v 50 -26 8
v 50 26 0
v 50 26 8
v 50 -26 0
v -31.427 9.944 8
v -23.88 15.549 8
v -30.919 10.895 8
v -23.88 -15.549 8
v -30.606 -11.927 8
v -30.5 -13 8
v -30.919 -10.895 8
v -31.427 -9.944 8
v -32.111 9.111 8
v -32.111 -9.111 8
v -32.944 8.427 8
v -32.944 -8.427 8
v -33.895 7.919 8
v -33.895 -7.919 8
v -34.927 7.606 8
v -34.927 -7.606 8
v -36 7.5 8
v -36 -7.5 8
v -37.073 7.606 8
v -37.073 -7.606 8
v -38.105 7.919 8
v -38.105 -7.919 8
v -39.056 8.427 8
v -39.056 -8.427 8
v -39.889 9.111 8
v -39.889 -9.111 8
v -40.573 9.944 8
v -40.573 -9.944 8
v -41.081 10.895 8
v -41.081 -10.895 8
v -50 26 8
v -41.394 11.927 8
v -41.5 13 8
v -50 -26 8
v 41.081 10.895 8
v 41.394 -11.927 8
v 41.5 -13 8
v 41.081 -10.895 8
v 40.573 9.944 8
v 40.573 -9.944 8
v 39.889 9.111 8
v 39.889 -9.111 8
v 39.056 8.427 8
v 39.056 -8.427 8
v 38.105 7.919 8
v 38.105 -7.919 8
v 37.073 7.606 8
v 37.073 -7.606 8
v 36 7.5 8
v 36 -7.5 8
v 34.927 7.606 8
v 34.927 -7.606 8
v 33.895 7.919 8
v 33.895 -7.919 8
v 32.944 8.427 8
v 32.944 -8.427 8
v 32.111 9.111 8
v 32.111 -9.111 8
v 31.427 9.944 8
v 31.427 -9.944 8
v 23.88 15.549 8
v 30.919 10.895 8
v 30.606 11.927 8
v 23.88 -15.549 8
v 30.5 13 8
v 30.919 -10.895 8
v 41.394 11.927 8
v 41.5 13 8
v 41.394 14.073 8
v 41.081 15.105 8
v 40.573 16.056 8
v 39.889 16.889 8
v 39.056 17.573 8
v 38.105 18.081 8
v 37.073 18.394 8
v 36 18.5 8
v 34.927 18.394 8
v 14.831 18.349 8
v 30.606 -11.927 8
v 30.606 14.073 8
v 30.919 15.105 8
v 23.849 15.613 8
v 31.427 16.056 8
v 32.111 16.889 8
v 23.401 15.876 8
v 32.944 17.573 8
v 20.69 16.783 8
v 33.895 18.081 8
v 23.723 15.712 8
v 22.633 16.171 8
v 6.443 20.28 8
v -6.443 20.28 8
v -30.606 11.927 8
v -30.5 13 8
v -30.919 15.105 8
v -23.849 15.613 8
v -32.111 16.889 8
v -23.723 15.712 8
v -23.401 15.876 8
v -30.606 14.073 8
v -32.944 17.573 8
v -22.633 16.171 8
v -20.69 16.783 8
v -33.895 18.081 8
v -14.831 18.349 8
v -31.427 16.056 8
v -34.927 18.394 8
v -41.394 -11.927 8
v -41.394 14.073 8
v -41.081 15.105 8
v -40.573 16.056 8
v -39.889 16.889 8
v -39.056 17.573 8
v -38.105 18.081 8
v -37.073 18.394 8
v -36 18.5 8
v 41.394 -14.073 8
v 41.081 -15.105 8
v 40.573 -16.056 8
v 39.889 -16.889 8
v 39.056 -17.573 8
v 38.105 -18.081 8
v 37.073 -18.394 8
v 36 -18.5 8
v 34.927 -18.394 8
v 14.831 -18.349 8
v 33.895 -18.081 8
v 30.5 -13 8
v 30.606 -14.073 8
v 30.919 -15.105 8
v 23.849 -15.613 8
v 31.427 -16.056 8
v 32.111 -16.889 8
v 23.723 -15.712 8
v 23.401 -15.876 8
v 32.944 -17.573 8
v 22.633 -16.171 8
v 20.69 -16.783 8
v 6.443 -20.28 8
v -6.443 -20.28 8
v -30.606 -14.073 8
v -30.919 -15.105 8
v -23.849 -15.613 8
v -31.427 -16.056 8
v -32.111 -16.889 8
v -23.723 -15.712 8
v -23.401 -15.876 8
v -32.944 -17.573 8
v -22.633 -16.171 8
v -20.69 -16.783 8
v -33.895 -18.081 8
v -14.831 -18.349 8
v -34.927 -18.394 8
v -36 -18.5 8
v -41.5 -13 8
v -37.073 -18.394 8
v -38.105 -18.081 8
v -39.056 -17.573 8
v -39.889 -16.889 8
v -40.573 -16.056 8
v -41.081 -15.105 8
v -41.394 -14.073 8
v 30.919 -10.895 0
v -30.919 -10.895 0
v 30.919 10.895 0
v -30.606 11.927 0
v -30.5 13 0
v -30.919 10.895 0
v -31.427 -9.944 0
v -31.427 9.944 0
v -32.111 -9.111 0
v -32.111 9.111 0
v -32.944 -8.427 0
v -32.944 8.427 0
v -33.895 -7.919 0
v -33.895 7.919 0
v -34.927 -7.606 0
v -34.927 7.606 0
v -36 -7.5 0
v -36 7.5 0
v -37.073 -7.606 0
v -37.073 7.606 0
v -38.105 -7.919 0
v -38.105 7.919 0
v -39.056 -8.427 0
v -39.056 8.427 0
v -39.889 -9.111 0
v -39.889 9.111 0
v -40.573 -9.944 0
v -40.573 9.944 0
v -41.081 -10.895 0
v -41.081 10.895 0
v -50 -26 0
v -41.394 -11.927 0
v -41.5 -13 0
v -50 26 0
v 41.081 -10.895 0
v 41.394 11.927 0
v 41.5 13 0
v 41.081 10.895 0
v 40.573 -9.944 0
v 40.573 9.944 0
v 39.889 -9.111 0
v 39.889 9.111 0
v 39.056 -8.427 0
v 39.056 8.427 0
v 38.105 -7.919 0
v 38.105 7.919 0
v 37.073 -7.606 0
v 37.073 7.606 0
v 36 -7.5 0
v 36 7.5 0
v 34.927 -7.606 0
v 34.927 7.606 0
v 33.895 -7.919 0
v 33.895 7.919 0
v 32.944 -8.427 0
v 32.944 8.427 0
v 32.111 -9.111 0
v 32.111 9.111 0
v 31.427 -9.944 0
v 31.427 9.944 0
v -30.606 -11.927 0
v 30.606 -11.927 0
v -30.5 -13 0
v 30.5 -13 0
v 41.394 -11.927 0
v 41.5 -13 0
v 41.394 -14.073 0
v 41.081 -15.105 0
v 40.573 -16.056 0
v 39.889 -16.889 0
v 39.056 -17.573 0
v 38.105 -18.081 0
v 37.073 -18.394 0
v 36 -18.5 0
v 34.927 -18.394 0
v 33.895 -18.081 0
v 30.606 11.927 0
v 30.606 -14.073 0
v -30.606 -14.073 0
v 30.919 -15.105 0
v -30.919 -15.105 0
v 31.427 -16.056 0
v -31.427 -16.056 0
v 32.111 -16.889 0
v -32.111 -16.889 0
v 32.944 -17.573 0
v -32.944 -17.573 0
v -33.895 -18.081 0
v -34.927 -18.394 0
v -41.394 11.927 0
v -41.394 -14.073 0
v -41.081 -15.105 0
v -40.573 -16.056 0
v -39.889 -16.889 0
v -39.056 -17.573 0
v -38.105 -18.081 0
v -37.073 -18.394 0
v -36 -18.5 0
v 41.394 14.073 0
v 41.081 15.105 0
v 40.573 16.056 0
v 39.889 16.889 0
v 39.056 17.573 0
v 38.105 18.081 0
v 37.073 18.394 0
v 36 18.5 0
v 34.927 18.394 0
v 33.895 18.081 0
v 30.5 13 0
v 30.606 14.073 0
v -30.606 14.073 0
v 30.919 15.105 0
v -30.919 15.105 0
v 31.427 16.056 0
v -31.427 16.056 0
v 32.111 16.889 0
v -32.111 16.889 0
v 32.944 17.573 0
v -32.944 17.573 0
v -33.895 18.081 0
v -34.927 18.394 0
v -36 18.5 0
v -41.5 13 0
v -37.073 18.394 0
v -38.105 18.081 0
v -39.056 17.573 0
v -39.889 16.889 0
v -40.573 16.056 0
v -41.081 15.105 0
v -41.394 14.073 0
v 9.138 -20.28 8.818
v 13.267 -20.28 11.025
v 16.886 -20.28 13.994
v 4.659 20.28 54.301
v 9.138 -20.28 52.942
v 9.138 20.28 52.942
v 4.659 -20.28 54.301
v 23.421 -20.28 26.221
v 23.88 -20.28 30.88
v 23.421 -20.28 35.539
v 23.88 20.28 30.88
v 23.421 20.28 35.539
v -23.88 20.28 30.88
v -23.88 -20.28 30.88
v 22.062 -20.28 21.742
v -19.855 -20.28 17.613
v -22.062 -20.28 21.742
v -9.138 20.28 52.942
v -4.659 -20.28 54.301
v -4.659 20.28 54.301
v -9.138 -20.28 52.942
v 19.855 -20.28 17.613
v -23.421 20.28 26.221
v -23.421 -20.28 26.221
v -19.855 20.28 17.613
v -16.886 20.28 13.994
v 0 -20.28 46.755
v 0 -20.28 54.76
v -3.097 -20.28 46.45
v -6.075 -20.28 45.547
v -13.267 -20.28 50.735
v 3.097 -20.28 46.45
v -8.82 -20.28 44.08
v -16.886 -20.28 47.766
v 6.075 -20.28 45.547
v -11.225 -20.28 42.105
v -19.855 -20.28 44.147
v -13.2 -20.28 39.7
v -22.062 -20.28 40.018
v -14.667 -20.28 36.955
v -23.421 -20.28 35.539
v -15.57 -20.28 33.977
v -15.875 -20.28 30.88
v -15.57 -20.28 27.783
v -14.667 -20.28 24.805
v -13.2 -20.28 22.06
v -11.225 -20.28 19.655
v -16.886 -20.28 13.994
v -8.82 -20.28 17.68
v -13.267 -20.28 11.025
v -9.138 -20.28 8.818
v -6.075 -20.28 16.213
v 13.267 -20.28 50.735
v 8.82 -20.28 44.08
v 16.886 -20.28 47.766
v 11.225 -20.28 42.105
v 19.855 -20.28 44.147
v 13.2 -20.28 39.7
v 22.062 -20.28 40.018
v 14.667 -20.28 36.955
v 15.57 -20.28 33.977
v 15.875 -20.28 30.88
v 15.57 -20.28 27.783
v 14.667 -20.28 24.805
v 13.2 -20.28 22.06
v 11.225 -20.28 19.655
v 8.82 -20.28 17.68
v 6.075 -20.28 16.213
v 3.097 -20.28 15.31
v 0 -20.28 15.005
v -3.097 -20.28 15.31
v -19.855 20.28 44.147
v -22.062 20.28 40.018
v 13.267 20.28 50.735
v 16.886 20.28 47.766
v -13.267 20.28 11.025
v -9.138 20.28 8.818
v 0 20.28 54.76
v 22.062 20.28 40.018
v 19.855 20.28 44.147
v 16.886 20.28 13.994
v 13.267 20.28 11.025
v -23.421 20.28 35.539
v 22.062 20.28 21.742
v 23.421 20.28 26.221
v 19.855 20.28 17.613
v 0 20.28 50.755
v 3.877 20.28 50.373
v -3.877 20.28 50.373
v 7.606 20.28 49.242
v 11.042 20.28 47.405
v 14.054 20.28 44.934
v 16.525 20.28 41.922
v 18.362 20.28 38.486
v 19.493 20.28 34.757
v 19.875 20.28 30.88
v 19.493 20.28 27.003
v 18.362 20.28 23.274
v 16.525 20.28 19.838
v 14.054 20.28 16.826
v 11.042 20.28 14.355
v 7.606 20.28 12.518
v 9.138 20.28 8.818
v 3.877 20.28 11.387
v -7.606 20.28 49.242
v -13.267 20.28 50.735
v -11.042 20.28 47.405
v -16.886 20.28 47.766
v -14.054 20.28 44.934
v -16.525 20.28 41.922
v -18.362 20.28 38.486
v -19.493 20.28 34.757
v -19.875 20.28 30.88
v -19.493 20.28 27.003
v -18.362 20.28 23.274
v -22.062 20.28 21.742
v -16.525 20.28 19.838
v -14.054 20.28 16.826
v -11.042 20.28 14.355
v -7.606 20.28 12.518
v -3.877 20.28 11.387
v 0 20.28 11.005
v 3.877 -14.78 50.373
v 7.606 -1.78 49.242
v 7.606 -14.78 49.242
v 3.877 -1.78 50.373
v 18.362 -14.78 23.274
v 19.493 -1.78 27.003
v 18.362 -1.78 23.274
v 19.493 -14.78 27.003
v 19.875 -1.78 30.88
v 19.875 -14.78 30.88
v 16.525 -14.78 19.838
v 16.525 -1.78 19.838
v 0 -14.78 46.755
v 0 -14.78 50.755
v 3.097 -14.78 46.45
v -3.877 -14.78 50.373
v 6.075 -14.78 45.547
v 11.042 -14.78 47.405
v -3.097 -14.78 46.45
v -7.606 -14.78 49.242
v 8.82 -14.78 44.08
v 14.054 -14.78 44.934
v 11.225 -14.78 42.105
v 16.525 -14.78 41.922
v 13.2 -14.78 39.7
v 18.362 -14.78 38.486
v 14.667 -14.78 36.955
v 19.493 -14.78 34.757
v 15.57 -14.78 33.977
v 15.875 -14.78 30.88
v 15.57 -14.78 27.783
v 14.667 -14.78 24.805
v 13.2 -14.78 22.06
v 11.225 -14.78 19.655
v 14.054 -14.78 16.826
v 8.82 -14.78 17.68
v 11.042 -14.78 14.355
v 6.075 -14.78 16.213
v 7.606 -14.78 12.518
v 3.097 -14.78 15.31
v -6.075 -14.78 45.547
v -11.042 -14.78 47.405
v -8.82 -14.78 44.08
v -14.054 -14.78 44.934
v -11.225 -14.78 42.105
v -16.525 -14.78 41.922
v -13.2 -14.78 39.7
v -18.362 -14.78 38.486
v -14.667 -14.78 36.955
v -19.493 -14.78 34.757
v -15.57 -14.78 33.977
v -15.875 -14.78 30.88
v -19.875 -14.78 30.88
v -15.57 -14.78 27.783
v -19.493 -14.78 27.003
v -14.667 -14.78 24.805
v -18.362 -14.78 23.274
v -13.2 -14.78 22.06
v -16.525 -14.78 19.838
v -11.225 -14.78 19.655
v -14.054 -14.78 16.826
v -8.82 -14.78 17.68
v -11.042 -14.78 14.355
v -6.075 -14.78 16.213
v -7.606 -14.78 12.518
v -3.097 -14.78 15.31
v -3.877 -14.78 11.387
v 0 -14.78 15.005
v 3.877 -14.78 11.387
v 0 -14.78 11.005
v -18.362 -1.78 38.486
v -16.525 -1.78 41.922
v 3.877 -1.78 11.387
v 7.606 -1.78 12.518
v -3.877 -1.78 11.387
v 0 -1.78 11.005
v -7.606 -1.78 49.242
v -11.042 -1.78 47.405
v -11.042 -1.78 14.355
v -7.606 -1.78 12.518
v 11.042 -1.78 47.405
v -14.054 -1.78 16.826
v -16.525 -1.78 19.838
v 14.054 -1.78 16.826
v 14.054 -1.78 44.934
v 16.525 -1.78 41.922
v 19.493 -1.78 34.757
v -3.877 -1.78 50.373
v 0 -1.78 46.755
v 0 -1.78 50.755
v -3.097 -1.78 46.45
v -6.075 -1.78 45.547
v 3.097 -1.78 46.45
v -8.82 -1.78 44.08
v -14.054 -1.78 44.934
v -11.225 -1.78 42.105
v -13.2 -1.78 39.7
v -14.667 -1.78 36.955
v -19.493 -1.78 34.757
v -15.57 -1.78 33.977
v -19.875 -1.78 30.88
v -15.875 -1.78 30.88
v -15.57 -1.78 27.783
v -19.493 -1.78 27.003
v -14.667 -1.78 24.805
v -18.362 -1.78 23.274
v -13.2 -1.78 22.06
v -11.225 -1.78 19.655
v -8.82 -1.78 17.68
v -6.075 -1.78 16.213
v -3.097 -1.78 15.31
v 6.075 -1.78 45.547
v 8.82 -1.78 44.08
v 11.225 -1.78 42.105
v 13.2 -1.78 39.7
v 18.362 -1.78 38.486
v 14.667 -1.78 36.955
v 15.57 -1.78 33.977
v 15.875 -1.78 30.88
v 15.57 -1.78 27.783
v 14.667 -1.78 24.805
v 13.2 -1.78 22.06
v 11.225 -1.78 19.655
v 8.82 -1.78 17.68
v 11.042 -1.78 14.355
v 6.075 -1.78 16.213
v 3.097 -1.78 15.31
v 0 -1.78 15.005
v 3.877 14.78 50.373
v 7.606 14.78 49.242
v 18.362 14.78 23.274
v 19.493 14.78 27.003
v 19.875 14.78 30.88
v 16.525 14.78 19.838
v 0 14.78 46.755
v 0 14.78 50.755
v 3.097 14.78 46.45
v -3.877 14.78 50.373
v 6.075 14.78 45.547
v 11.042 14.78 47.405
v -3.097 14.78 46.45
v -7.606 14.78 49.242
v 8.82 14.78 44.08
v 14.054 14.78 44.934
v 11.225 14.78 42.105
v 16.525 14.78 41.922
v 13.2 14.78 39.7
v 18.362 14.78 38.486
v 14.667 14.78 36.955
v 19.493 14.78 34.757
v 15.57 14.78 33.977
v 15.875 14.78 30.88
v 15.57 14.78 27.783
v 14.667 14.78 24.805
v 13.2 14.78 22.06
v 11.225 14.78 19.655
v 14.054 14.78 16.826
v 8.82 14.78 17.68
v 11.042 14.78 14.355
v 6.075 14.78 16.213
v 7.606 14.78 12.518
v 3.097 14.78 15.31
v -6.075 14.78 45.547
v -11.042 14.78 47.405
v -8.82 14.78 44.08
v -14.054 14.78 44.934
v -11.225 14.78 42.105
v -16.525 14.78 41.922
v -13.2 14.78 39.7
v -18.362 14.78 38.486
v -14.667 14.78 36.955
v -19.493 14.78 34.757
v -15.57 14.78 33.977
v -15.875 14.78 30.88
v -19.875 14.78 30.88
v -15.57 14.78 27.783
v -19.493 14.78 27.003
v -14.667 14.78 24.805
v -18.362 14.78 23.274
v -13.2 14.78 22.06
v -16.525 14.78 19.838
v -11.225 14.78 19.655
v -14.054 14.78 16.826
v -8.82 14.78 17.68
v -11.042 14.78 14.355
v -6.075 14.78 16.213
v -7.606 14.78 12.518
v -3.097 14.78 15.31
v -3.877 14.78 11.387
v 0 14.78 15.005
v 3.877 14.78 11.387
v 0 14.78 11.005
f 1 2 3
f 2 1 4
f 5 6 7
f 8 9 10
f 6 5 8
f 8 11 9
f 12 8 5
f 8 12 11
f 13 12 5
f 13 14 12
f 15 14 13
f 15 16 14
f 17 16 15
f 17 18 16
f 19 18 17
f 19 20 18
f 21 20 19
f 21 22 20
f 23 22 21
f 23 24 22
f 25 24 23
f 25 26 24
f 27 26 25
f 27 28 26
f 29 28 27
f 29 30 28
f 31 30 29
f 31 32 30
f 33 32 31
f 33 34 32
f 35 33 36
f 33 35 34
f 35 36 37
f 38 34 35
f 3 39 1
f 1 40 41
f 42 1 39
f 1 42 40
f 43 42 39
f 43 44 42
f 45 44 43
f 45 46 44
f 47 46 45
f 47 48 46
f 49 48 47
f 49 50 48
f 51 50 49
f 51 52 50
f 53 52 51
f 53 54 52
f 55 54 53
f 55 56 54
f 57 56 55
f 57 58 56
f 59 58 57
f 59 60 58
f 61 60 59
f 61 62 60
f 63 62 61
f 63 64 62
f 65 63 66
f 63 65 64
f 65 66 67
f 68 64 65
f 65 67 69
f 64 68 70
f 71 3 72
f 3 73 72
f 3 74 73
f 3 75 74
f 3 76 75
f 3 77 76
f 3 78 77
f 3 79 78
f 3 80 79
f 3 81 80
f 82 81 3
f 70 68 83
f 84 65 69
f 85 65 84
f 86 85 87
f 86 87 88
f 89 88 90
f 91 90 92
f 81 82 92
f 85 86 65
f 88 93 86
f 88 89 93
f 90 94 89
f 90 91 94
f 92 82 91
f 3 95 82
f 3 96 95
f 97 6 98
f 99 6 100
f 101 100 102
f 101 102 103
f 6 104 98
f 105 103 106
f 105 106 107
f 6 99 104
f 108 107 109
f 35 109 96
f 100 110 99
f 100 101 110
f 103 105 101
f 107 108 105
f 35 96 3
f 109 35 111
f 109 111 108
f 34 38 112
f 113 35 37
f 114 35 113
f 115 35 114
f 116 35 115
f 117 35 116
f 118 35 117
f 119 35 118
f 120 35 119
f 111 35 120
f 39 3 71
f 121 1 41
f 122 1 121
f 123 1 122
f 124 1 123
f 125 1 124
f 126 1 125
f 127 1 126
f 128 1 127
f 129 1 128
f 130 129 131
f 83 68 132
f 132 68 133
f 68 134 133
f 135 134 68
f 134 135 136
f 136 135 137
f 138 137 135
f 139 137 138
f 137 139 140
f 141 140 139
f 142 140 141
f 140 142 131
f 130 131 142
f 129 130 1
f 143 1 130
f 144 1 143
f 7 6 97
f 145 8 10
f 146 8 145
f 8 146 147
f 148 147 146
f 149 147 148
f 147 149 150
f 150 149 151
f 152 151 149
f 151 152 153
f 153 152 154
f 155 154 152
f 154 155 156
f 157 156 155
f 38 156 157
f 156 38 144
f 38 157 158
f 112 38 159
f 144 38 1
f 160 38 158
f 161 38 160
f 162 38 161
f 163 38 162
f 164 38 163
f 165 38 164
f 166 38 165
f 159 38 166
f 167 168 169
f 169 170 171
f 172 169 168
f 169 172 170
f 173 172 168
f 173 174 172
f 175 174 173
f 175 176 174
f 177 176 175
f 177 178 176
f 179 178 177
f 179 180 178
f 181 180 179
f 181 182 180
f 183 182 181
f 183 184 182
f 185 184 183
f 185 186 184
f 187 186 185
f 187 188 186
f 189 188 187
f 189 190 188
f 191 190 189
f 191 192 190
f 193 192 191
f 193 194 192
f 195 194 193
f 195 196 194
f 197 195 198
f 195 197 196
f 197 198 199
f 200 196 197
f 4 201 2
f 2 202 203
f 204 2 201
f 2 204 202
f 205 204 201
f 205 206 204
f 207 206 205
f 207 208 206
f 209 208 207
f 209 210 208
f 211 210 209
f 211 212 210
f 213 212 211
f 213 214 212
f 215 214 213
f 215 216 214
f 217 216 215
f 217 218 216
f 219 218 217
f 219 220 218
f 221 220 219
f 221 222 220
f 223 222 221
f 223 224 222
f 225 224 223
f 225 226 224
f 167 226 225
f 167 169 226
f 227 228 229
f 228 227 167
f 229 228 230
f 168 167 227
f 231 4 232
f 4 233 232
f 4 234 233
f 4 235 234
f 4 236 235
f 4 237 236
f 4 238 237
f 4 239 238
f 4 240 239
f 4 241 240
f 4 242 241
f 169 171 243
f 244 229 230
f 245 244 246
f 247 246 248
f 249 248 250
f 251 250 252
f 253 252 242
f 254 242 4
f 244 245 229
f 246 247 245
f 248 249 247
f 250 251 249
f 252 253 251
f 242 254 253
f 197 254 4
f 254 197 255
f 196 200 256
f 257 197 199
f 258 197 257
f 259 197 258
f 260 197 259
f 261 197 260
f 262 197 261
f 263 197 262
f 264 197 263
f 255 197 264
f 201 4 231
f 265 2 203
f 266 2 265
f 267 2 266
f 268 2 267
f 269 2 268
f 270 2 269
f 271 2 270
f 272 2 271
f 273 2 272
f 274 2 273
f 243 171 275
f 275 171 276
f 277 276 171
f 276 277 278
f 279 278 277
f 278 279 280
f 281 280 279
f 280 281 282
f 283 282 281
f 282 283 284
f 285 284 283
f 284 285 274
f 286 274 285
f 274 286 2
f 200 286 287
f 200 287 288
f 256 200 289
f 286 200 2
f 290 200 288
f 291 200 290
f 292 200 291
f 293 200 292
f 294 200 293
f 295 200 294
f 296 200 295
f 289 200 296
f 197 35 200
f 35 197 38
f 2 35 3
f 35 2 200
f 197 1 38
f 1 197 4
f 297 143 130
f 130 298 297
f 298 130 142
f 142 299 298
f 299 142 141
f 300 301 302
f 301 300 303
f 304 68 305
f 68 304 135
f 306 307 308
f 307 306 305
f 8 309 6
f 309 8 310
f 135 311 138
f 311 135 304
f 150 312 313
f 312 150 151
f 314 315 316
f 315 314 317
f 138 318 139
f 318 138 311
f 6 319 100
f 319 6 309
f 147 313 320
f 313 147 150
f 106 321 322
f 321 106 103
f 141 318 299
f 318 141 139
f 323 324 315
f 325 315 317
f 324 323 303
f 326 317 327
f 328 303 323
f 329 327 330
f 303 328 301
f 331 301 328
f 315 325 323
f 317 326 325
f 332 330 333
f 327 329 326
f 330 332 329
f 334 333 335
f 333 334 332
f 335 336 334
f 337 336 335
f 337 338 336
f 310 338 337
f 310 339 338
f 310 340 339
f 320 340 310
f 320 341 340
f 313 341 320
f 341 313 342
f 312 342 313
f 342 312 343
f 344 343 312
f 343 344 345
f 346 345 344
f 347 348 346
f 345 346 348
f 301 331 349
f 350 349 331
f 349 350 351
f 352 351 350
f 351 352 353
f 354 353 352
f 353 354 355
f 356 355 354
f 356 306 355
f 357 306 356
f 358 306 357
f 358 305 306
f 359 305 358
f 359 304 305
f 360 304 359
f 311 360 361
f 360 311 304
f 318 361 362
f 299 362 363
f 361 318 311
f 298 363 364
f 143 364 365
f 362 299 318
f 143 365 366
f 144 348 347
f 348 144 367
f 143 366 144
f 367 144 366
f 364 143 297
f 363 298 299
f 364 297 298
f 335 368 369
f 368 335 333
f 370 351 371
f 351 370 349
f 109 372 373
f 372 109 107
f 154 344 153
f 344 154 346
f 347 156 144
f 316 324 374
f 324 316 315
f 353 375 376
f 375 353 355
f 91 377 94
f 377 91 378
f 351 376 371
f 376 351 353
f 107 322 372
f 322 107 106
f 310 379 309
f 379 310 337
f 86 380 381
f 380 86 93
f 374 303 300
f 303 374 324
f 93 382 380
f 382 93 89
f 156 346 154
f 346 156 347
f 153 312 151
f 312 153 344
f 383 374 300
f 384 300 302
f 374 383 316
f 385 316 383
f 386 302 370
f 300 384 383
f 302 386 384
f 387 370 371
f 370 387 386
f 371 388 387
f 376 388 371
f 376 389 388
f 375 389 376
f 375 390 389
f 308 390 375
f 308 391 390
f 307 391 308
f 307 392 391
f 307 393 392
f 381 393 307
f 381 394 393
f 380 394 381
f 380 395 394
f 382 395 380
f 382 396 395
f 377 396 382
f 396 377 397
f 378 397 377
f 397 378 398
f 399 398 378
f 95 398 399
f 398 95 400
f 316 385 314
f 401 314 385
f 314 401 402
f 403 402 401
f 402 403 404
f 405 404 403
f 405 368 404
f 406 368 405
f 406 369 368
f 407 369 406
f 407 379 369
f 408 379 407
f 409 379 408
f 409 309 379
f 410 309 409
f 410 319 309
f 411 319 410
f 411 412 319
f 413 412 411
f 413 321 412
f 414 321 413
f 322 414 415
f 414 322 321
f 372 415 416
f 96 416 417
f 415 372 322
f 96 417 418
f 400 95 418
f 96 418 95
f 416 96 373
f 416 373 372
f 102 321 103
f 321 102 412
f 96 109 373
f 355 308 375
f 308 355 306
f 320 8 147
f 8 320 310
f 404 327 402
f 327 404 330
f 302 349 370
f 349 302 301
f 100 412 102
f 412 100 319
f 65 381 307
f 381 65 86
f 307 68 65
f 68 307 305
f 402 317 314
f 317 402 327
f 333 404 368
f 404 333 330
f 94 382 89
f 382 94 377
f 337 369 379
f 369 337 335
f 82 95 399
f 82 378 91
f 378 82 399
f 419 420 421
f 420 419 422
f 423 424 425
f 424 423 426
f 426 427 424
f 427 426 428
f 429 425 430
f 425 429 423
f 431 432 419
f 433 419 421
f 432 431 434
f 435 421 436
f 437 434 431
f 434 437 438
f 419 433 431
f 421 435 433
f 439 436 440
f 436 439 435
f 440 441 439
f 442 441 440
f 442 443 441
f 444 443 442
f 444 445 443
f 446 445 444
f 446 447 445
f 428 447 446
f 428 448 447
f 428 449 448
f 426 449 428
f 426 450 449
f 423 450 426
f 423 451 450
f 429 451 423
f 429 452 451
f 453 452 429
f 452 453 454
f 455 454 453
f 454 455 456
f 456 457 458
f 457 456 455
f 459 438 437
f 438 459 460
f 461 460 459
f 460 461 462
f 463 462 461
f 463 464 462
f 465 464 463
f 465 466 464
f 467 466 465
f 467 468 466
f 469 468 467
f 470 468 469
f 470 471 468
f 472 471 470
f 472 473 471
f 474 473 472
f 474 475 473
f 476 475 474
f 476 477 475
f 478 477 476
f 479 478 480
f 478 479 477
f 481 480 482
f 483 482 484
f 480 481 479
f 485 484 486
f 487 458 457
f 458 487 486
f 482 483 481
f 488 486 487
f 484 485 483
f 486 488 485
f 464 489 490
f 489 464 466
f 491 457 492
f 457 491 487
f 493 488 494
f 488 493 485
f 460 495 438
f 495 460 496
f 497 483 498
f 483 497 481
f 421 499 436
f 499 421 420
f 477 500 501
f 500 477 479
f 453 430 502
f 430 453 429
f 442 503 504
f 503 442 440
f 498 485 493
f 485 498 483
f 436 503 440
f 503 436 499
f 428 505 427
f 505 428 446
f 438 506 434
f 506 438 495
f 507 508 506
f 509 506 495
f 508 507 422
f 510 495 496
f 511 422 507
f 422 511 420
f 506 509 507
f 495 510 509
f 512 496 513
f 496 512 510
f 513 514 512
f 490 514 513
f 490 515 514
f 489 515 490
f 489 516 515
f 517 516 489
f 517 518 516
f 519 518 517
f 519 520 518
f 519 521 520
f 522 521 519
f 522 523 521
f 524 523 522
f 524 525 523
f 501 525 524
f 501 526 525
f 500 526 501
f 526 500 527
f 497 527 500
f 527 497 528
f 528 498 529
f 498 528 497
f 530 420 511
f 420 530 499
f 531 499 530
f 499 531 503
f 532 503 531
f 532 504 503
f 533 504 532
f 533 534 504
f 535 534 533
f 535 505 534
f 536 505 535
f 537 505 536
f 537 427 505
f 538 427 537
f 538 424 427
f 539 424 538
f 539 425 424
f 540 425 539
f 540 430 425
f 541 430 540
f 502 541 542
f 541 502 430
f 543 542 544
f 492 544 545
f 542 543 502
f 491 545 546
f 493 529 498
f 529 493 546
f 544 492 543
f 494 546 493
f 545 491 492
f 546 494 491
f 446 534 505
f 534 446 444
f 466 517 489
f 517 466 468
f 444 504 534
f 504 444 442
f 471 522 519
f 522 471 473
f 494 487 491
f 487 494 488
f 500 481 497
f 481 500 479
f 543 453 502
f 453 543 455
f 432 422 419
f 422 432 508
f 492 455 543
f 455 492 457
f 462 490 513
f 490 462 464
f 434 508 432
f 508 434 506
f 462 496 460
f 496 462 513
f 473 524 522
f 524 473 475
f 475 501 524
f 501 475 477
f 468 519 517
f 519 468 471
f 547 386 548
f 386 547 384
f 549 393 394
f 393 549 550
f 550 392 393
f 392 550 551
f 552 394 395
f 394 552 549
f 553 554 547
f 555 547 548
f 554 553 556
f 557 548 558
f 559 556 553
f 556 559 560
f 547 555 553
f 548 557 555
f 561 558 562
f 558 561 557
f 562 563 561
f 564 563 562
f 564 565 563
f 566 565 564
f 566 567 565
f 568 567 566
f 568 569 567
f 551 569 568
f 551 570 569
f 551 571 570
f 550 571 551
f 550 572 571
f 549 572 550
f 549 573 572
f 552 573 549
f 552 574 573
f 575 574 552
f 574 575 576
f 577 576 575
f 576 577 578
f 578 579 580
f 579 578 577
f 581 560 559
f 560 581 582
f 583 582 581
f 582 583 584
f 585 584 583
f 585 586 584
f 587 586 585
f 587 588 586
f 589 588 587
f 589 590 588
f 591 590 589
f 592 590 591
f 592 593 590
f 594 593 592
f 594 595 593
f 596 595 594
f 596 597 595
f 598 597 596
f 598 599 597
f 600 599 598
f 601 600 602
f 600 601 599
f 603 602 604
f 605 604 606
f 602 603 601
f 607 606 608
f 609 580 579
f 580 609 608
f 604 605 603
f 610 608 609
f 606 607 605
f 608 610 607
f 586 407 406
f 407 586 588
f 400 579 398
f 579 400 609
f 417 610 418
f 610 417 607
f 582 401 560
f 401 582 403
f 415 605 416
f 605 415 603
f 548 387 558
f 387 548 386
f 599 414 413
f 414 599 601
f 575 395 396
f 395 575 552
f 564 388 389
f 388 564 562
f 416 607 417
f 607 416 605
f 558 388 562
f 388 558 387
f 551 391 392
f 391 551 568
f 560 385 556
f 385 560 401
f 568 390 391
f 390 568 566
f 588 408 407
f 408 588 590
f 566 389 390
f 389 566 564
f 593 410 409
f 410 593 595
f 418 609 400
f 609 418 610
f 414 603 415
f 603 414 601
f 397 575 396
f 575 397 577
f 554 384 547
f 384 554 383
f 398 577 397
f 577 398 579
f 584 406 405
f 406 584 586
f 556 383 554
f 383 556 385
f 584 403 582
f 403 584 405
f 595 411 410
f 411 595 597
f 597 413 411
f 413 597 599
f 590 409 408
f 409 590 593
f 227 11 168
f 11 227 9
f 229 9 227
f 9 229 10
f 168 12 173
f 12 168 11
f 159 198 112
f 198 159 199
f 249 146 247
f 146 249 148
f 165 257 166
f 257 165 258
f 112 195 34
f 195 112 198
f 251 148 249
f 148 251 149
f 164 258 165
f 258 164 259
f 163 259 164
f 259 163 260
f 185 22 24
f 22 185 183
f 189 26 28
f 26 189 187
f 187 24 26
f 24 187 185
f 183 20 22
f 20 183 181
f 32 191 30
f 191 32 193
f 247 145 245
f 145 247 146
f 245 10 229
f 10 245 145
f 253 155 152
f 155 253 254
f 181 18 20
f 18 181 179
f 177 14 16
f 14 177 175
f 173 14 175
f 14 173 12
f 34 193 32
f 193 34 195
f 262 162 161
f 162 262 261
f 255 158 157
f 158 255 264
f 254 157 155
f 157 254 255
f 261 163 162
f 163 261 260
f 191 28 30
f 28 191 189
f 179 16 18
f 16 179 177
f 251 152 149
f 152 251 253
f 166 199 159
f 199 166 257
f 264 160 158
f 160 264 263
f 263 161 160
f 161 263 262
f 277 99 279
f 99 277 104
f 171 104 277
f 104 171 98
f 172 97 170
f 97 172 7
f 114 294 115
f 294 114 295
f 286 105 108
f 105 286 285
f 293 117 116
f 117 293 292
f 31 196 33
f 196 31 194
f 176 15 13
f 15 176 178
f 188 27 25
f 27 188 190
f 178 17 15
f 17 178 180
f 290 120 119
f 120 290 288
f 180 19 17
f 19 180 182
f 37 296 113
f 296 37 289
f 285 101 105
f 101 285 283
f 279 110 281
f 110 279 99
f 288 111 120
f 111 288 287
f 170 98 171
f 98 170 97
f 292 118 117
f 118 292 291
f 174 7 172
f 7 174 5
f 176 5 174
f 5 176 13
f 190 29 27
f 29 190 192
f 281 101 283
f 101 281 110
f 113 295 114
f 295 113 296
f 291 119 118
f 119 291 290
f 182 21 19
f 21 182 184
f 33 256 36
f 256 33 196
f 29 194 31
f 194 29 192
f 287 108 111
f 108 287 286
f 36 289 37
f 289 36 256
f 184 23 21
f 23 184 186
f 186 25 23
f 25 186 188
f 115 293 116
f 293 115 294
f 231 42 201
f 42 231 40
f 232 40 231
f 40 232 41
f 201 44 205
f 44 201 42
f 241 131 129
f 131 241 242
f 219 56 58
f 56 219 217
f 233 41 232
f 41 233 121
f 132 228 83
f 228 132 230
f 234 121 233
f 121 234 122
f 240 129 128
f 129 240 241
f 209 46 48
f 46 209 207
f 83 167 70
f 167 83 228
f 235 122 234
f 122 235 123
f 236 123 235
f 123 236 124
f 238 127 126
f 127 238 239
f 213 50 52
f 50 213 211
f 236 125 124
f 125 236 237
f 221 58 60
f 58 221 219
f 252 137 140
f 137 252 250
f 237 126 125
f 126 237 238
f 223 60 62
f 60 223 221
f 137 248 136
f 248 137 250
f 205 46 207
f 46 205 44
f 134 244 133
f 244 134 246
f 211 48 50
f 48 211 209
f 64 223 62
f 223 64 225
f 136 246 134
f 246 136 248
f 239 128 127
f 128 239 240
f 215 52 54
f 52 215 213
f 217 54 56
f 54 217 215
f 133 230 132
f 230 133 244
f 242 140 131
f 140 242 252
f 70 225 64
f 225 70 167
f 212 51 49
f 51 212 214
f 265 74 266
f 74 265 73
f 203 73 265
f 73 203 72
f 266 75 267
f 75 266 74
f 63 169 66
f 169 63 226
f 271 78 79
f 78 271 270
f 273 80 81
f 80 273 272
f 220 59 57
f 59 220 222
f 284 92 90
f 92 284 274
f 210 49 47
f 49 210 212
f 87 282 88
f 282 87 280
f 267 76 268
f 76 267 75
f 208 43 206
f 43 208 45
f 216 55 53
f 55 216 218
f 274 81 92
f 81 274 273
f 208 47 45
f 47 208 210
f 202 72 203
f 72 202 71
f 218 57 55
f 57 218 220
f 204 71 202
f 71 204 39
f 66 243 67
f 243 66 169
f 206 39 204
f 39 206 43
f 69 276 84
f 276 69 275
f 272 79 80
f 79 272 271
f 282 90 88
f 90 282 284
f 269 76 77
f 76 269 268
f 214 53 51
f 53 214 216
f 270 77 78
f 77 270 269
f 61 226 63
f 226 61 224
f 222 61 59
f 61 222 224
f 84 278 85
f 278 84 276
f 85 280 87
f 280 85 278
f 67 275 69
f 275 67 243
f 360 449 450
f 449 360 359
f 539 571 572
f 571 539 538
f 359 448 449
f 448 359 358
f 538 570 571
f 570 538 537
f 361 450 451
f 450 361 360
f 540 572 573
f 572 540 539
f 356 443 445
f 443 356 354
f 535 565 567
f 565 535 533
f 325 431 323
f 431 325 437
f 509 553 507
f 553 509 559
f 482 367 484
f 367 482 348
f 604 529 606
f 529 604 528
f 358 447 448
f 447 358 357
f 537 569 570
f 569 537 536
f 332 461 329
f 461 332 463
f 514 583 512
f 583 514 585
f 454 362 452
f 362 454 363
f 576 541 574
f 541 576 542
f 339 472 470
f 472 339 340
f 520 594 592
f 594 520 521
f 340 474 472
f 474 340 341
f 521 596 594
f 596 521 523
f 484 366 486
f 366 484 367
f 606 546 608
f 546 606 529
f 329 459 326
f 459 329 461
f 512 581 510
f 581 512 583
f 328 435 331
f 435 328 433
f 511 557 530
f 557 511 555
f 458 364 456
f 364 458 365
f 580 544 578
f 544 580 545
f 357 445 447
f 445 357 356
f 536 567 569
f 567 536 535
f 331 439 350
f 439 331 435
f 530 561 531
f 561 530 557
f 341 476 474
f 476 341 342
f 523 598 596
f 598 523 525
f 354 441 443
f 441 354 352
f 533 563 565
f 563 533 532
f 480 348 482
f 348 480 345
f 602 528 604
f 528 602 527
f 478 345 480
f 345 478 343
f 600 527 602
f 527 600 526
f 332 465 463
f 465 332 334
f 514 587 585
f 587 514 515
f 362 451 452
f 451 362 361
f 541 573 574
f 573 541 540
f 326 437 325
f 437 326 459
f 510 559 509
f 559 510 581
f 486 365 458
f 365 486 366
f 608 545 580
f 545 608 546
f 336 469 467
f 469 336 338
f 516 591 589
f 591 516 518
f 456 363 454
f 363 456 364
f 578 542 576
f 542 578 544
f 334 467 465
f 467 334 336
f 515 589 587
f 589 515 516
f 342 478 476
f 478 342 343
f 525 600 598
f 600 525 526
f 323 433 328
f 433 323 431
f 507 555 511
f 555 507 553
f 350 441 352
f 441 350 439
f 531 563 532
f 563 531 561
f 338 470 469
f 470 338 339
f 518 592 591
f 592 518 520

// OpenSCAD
$fn = 32;

// ----------------------------------------------------------------------
// Bearing block: 100 x 52 mm base, 31.75 mm bore at 30.88 mm
// ----------------------------------------------------------------------

// --- parameters (mm) ---
base_w = 100;             // base width
base_d = 52;              // base depth
base_t = 8;               // base thickness
bore_d = 31.75;           // shaft / bearing bore
house_r = 23.88;          // housing outer radius
house_len = 40.56;        // housing length along the shaft
foot_w = 47.76;           // foot width under the housing
foot_len = 30.56;         // foot length along the shaft
axis_z = 30.88;           // bore axis height above the base
holes_d = 11;             // mounting holes
hole_x = 36;              // mounting hole spacing
seat_d = 8;               // bearing seat depth
seat_wall = 4;            // seat wall thickness

difference() {
  union() {
    /* base plate with its underside on z = 0 */
    translate([0, 0, base_t / 2]) cube([base_w, base_d, base_t], center = true);
    /* hull foot: a straight web blending into the round housing */
    hull() {
      translate([0, 0, base_t - 0.5]) cube([foot_w, foot_len, 1.6], center = true);
      translate([0, 0, axis_z]) rotate([-90, 0, 0]) cylinder(h = house_len, d = 2 * house_r, center = true);
    }
  }
  /* bore through the housing, 2.5 mm clear on both sides */
  translate([0, 0, axis_z]) rotate([-90, 0, 0]) cylinder(h = house_len + 5, d = bore_d, center = true);
  /* bearing seats, recessed into both ends of the housing */
  for (sy = [-1, 1]) {
    translate([0, sy * (house_len / 2 - seat_d + 2.5), axis_z]) rotate([-90, 0, 0]) cylinder(h = seat_d + 5, d = bore_d + 2 * seat_wall);
  }
  /* mounting holes through the base plate */
  for (hx = [-36, 36]) {
    for (hy = [-13, 13]) {
      translate([hx, hy, -2.5]) cylinder(h = base_t + 5, d = holes_d);
    }
  }
}
